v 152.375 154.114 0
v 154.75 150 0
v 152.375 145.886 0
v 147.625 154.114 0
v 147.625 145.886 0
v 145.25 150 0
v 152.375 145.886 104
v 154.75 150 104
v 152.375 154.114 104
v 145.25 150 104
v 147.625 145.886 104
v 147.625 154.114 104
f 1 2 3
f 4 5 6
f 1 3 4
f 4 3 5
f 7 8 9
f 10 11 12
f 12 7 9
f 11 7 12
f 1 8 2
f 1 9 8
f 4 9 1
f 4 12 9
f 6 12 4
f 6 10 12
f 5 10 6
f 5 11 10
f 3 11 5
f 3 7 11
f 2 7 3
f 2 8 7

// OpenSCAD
epsilon = 0.1;

module hole(hole_depth, hole_radius, hole_sides) {
    linear_extrude(hole_depth + epsilon) circle(r=hole_radius, $fn=hole_sides)  ;
}

module shelf(height=100, width=100, thickness=5, hole_inset=5, hole_depth=3, hole_radius=3, hole_sides=6) {
    difference() {
        cube([height, width, thickness]);
        translate([hole_inset + hole_radius, hole_inset + hole_radius, thickness - hole_depth]) hole(hole_depth, hole_radius, hole_sides);
        translate([height - hole_inset - hole_radius, hole_inset + hole_radius, thickness - hole_depth]) hole(hole_depth, hole_radius, hole_sides);
        translate([hole_inset + hole_radius, width - hole_inset - hole_radius, thickness - hole_depth]) hole(hole_depth, hole_radius, hole_sides);
        translate([height- hole_inset - hole_radius, width - hole_inset - hole_radius, thickness - hole_depth]) hole(hole_depth, hole_radius, hole_sides);
    }
}

module support(height=100, hole_radius=3, hole_sides=6, tolerance=0.1) {
    linear_extrude(height) circle(r=hole_radius - tolerance, $fn=hole_sides);
}

// Parameters
height = 90;
inner_width = 90;
inner_depth = 140;
thickness = 10;
hole_depth = 7;
hole_radius = 5;
hole_inset = 5;

width = inner_width + 2 * (hole_inset + hole_radius);
depth = inner_depth + 2 * (hole_inset + hole_radius);

// shelf(height=depth, width=width, thickness=thickness, hole_radius=hole_radius, hole_depth=hole_depth, hole_inset=hole_inset);
translate([150, 150, 0]) support(height=height + 2 * hole_depth, hole_radius=hole_radius, tolerance=0.25);
